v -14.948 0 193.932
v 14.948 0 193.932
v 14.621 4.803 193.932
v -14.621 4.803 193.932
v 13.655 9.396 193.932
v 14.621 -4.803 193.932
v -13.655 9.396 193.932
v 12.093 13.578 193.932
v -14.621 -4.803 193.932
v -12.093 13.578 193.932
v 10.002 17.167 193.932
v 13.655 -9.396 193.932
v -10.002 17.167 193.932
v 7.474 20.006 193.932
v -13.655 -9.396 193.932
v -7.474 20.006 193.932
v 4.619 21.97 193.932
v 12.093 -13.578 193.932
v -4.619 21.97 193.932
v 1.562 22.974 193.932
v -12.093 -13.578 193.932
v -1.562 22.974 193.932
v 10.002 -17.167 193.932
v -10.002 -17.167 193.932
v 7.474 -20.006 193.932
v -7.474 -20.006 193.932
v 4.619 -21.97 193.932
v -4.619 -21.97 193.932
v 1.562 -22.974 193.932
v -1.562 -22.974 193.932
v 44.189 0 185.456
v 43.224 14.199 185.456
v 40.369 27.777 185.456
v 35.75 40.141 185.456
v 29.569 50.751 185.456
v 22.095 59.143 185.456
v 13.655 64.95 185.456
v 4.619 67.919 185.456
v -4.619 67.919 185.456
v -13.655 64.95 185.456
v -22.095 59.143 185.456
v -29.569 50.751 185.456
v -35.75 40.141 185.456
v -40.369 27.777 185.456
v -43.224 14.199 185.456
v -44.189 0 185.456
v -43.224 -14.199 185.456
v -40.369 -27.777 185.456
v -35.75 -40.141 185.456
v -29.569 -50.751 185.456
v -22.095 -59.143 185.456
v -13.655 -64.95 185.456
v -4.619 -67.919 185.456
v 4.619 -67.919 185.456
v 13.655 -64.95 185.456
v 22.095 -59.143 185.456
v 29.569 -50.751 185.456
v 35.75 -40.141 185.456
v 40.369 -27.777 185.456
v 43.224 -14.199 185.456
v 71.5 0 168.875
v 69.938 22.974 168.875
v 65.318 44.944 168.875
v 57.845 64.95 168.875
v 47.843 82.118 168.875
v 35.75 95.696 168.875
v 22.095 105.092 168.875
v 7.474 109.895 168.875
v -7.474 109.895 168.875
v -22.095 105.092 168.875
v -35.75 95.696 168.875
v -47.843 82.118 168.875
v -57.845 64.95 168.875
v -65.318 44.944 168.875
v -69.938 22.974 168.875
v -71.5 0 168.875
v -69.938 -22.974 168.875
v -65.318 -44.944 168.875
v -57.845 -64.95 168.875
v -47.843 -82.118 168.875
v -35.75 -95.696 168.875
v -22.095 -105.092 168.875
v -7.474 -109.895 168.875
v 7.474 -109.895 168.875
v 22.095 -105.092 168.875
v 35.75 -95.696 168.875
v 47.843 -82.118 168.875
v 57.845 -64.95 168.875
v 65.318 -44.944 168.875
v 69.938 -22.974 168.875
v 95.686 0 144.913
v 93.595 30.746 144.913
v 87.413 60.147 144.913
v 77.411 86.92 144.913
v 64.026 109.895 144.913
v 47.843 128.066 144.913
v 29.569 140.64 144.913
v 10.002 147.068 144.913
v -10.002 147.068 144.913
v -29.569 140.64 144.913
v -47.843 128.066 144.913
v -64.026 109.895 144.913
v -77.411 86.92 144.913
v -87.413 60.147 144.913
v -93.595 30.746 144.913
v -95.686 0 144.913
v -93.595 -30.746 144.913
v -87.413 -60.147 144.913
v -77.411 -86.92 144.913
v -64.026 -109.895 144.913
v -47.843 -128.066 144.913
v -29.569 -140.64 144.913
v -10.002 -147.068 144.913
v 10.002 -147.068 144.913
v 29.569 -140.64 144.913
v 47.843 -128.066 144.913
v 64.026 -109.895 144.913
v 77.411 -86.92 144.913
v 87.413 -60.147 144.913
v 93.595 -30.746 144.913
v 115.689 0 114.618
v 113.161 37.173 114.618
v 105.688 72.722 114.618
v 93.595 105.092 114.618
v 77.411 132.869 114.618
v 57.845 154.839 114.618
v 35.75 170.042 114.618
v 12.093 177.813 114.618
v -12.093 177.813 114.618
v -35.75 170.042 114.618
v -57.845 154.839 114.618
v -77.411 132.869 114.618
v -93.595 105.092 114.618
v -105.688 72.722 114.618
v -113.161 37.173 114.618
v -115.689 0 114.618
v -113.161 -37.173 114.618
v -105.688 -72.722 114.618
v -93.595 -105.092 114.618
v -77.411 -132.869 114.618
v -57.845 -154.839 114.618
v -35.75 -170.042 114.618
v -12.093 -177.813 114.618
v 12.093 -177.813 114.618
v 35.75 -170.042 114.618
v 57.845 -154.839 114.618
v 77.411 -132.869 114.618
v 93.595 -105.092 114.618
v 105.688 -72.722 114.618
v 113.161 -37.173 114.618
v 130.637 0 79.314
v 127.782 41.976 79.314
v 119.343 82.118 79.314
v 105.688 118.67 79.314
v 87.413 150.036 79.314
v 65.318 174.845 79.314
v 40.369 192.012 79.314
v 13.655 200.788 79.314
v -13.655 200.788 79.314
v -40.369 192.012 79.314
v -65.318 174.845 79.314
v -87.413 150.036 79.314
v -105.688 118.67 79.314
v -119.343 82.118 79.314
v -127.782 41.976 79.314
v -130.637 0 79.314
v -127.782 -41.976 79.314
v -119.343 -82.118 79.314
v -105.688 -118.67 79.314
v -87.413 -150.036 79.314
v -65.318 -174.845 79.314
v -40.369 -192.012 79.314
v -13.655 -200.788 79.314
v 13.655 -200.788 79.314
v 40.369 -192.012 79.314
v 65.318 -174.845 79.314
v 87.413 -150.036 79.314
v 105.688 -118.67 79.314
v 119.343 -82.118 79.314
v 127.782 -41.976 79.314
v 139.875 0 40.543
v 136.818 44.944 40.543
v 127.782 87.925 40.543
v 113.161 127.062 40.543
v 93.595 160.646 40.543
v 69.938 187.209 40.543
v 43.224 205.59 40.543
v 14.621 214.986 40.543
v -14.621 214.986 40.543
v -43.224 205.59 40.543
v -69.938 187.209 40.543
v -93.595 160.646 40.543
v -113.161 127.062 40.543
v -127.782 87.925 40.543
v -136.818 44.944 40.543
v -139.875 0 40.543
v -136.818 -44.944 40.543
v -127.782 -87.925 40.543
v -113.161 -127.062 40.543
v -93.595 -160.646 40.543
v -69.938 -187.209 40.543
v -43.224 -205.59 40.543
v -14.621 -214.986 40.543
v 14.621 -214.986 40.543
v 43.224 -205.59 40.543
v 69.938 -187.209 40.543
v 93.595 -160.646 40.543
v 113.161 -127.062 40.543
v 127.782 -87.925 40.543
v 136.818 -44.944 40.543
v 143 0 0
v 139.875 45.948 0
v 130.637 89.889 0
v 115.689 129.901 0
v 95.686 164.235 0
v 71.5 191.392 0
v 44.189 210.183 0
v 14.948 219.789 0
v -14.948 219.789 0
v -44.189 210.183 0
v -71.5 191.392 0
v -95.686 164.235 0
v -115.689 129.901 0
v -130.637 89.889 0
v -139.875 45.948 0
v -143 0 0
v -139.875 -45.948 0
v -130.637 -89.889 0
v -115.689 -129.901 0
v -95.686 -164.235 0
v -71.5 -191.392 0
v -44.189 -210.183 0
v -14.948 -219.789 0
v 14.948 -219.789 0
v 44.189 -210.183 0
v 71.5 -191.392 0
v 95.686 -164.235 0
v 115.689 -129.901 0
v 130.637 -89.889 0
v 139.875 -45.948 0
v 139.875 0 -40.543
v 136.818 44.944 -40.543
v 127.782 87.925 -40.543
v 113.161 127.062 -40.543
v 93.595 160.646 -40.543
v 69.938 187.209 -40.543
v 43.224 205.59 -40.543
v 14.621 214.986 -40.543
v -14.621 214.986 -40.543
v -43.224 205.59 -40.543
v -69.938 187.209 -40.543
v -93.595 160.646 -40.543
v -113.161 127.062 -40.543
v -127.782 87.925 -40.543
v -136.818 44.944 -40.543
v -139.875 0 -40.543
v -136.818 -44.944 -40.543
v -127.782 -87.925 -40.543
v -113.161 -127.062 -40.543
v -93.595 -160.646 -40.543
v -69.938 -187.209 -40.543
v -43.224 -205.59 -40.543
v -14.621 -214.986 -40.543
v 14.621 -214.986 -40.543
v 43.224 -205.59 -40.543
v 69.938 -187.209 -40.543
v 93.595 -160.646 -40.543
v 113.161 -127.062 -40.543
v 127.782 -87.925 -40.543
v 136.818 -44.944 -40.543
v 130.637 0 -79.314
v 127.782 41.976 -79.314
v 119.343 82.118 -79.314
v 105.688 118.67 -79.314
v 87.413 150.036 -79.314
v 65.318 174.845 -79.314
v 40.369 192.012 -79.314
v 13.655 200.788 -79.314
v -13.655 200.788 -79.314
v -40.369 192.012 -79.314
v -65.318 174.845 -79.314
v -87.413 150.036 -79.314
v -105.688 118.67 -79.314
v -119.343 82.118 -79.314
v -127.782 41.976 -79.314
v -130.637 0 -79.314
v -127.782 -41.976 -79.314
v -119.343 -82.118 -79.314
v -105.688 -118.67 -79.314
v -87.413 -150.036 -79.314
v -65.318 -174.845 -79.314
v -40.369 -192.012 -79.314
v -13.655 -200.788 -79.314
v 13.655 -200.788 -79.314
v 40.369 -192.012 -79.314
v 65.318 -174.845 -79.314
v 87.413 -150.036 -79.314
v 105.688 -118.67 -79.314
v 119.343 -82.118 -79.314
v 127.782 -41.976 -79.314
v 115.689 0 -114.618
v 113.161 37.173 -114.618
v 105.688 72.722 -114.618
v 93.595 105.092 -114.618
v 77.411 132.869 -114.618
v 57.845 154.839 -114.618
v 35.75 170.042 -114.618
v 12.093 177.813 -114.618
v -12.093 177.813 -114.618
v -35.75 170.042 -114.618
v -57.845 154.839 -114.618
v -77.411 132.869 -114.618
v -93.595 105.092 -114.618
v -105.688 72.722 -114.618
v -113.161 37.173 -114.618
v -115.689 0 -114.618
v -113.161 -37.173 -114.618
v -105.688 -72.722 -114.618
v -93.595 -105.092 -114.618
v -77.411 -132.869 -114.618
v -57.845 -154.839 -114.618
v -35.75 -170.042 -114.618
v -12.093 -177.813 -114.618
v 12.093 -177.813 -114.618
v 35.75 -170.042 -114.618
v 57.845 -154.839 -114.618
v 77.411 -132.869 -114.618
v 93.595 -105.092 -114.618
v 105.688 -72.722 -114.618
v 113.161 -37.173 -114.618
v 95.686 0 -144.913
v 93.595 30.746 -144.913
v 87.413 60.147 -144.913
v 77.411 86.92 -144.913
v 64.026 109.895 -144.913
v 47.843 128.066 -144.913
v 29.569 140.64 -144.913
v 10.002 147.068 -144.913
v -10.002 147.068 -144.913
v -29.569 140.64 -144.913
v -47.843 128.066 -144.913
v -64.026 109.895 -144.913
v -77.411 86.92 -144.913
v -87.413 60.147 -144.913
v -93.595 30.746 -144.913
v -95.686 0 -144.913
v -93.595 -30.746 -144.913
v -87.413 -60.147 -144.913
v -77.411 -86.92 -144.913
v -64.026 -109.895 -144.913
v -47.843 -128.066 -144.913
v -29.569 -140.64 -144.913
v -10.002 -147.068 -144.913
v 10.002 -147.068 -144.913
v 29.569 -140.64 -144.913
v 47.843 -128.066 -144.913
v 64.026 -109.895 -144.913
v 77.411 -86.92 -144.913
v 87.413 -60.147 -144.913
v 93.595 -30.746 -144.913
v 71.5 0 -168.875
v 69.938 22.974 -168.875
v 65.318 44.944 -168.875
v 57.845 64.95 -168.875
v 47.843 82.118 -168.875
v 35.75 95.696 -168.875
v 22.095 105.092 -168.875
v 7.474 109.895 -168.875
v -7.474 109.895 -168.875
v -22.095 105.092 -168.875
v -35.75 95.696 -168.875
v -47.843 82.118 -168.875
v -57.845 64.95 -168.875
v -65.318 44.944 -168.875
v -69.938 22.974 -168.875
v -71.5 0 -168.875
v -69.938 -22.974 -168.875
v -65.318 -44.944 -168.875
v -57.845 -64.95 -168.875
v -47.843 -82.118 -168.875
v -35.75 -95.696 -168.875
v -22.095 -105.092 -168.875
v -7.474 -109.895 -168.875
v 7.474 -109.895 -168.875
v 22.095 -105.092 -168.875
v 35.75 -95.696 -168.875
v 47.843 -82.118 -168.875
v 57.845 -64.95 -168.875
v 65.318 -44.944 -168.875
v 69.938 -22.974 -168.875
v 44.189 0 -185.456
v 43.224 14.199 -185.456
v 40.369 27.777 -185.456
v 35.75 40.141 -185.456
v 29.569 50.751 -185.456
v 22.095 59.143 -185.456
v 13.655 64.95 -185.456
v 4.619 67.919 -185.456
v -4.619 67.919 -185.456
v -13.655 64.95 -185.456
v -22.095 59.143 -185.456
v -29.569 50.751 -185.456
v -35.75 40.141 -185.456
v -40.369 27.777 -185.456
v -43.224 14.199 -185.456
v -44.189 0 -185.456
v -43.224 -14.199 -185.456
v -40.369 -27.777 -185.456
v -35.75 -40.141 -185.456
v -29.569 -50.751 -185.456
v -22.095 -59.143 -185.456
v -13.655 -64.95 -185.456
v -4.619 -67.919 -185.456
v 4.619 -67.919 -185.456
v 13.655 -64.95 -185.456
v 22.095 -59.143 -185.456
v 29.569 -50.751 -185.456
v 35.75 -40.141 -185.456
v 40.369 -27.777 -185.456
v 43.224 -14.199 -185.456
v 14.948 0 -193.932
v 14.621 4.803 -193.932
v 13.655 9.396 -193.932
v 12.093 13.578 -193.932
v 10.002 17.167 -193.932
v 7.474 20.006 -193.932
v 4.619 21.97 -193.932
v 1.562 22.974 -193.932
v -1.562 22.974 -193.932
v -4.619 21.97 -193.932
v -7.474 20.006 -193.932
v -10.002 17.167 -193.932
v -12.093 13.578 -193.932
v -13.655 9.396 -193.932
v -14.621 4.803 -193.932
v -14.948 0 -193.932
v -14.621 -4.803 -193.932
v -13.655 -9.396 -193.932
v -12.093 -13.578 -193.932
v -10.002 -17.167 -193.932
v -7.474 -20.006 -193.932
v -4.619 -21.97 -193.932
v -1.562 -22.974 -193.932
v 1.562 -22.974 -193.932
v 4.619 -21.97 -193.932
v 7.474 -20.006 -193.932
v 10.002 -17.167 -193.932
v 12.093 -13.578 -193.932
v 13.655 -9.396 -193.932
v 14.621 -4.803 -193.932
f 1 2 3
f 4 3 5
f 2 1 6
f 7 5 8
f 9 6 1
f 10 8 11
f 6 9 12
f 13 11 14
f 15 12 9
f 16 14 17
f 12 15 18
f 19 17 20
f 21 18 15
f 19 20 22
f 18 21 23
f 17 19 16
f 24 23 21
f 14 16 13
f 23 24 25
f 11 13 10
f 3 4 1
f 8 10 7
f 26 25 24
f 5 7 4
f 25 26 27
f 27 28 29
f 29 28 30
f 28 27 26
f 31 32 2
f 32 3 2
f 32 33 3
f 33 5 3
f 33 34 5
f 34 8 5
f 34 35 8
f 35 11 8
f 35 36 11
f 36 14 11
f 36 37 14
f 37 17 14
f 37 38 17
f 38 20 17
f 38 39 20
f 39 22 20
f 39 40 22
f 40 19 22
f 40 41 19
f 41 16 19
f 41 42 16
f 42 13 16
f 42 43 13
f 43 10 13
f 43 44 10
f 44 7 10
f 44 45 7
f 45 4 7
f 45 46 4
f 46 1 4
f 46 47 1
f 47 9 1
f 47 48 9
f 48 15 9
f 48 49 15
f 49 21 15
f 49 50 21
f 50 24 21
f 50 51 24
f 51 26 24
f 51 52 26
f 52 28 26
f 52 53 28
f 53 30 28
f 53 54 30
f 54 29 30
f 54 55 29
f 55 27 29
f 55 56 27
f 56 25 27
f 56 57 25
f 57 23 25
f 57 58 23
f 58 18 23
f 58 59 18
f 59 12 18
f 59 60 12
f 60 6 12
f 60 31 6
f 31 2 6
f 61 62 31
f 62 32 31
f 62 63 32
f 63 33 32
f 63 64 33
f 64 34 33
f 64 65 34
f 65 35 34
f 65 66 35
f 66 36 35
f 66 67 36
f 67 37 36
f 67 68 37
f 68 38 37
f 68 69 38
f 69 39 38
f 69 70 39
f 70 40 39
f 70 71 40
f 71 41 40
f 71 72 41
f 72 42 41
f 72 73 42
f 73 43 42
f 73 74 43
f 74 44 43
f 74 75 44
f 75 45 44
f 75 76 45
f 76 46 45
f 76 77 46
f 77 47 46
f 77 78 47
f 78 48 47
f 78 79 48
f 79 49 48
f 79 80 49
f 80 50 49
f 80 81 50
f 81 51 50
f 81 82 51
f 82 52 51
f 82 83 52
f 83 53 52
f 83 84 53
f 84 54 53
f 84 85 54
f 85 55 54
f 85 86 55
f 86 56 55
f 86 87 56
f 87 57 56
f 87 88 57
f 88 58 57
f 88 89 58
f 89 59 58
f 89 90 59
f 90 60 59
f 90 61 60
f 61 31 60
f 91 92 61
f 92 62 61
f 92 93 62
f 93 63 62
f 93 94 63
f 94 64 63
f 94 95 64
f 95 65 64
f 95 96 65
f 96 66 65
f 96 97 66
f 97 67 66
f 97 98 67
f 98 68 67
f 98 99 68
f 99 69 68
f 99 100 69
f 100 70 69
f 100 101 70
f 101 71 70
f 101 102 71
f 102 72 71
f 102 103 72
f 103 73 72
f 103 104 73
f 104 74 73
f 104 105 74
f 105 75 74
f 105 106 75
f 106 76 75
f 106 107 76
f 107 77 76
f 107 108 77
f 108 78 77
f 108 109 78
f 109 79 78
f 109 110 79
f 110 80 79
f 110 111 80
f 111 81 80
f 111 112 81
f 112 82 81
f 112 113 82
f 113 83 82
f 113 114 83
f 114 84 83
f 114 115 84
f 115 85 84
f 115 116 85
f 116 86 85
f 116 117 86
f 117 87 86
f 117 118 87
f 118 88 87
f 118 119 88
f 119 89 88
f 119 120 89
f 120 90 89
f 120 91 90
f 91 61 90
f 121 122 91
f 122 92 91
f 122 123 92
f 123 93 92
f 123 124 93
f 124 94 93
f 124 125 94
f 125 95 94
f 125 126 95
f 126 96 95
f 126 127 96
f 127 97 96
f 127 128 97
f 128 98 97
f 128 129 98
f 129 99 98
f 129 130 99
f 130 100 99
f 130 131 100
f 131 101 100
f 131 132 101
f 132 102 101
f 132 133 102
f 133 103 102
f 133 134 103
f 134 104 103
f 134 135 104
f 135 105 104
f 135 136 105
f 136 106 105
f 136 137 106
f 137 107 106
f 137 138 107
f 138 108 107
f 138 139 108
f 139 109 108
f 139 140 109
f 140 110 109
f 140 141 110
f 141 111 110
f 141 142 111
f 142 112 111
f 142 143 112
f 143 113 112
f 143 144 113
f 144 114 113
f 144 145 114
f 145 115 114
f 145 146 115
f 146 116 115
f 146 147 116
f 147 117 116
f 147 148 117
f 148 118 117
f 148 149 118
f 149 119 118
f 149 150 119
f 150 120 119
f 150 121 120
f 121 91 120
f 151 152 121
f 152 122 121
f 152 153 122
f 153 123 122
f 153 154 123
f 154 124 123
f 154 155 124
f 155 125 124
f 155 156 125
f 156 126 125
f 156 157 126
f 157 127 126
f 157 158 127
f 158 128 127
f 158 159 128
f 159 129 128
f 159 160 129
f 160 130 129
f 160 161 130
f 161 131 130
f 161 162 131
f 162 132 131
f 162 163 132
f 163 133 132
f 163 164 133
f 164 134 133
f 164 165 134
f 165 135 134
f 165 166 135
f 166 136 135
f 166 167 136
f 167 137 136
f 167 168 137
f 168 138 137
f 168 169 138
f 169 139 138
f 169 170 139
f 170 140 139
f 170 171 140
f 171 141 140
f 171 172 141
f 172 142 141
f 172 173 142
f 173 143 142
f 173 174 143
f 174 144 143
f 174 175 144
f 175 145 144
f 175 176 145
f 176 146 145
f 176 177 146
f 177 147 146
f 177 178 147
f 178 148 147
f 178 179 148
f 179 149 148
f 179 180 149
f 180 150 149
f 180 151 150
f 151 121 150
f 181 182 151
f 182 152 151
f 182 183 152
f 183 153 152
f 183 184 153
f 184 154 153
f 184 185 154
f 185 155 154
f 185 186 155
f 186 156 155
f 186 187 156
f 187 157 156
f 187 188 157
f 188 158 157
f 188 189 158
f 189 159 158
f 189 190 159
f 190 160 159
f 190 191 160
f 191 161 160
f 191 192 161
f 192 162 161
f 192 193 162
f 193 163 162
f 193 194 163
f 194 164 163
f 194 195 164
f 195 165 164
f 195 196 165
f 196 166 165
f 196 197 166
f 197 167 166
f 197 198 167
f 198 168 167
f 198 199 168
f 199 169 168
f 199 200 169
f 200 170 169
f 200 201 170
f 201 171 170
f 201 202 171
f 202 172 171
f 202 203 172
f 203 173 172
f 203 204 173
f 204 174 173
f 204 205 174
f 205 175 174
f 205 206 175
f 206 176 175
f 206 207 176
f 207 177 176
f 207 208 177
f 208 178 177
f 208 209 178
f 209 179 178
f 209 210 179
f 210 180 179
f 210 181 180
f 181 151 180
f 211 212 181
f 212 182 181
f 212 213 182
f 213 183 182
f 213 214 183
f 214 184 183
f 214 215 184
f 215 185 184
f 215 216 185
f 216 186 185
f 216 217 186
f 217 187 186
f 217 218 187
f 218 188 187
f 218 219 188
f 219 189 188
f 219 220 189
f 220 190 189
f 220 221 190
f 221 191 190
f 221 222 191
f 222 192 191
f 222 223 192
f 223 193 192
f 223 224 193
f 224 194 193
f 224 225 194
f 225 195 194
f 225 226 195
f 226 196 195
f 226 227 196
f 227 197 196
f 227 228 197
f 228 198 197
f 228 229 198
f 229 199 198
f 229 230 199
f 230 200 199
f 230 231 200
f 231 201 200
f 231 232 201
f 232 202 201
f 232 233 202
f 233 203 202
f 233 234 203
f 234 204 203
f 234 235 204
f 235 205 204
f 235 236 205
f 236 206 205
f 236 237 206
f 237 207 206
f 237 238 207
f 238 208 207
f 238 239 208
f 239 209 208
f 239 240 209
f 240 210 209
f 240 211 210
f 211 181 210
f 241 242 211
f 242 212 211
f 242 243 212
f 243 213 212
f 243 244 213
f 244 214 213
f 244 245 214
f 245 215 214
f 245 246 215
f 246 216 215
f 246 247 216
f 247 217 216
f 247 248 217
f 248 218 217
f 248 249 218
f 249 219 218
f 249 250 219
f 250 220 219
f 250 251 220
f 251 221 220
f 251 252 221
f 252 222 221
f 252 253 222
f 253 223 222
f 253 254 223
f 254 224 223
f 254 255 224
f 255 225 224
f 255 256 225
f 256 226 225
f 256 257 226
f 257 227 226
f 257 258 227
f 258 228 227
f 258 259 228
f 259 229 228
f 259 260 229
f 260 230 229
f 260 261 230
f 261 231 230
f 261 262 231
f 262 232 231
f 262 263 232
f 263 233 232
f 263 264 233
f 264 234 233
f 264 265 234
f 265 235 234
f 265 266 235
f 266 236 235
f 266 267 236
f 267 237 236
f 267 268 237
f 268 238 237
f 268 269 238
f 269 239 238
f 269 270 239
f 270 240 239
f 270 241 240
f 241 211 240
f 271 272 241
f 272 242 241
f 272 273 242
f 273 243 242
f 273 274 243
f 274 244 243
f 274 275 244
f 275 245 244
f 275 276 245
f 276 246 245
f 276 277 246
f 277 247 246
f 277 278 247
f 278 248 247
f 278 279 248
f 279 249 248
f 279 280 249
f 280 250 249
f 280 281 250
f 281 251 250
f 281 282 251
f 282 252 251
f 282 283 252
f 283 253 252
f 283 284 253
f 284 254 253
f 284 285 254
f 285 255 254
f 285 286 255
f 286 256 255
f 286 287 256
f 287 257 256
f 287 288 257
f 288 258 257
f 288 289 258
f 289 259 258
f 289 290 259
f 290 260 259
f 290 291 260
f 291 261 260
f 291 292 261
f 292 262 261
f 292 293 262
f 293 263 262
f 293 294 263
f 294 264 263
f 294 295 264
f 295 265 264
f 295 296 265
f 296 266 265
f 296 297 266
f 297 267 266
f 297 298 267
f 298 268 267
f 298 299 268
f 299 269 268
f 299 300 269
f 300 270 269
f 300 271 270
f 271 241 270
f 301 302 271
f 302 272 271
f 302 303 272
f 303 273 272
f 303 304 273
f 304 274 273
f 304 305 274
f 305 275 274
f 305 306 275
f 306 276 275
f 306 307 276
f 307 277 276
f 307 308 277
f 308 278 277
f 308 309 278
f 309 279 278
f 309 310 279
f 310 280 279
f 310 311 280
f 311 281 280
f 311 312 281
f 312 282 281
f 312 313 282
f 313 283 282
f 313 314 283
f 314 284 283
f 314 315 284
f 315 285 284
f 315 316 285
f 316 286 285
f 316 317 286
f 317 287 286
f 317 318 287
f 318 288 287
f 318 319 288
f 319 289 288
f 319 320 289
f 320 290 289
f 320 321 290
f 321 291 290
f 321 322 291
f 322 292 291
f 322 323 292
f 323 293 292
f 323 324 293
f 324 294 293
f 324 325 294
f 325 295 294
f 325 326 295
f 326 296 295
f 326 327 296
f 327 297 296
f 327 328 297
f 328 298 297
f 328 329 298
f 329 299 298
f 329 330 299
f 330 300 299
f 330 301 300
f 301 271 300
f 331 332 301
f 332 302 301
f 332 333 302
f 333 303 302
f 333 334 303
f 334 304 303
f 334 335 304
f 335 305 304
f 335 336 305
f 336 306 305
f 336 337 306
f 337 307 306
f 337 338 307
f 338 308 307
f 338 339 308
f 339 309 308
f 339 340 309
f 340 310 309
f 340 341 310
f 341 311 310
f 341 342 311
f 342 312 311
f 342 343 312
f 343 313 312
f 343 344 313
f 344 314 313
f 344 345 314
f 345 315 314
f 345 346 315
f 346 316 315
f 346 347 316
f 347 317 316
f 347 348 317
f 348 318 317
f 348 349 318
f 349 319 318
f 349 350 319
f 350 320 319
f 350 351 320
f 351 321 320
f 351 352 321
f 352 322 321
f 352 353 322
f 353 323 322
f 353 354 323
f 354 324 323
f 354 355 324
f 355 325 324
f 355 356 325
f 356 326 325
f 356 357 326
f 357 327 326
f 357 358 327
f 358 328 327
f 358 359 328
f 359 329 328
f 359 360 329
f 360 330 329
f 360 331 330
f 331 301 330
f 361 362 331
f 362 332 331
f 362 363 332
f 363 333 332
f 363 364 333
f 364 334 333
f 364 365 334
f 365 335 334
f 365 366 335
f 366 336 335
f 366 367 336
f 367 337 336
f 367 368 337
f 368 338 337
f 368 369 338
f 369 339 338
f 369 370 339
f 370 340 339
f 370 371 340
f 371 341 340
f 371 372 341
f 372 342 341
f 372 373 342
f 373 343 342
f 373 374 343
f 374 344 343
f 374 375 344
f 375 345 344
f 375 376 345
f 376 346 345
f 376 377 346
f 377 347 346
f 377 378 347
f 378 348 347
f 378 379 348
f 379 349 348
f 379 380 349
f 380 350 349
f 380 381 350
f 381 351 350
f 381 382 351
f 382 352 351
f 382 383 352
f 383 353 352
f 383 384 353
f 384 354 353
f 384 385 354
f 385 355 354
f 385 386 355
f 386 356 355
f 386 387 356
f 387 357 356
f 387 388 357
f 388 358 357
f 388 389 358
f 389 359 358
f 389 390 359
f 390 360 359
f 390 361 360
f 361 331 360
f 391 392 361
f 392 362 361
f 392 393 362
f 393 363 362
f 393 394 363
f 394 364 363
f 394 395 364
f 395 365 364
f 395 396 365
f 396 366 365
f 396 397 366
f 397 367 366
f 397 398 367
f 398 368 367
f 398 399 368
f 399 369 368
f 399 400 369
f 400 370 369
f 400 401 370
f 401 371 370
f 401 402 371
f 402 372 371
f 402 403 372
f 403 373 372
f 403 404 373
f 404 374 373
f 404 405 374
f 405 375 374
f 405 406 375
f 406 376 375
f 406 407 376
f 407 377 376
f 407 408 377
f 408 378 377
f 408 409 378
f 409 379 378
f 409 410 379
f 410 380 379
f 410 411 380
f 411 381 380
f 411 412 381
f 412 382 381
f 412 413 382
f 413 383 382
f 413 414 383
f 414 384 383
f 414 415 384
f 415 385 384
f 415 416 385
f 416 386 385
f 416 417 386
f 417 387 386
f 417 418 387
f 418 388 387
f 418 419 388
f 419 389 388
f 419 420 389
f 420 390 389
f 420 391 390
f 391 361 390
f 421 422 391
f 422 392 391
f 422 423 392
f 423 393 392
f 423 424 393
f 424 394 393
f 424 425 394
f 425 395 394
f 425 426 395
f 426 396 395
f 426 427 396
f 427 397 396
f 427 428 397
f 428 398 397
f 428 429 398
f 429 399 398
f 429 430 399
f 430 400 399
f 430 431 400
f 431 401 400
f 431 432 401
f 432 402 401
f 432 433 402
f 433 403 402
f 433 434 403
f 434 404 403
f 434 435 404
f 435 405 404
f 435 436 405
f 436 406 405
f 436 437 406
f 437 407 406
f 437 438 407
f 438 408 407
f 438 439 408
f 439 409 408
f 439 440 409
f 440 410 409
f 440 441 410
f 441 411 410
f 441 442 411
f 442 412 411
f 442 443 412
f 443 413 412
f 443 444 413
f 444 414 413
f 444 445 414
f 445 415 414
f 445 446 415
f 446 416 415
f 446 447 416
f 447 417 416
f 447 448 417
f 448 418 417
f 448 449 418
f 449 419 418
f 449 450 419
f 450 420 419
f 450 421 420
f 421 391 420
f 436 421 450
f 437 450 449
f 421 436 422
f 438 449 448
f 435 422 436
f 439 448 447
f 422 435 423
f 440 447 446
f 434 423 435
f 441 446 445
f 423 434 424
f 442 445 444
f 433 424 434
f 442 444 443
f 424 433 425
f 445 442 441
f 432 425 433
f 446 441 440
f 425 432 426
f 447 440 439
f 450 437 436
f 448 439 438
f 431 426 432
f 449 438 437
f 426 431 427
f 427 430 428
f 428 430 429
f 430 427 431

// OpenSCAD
// Generated by SolidPython 1.0.1 on 2020-07-29 00:46:50


scale(v = [11, 17, 15]) {
	sphere(r = 13);
}
/***********************************************
*********      SolidPython code:      **********
************************************************
 
# import packages: SolidPython
from solid import *
from solid.utils import *
from itertools import chain, combinations, permutations


class Resize:

    def __init__(self, scad_file):
        self.scad_file = scad_file
        #self.scad_file = import_scad(scad_file)
        # cone/cylinder param:
        self.r1 = 0
        self.r2 = 0
        self.h = 0
        # rectangular prism param:
        self.w = 0
        self.l = 0
        # ellipse param:
        self.r = 0

    # import OpenScad code (file name corresponds to shape)


    # classify shape + parameters
    def assign(self, param1, param2, param3):
        if self.scad_file == 'cone.scad':
            self.r1 = param1
            self.r2 = param2
            self.h = param3
        elif self.scad_file == 'cylinder.scad':
            self.r1 = param1
            self.r2 = param2
            self.h = param3
        elif self.scad_file == 'rectangularPrism.scad':
            self.h = param1
            self.l = param2
            self.w = param3
        else:
            self.r = param1
            self.h = param2

    # resize parameters
    def iterate(self):
        x = range(3, 20, 2)
        i = 1
        if self.scad_file == 'cone.scad':
            tempList = list(permutations(x, 2))
            for temp in tempList:
                param1 = temp[0]
                param2 = temp[1]
                filepath = 'produced_scad_files/' + 'cone' + str(param1) + '_' + str(param2) + '_' + '.scad'
                scad_render_to_file(cylinder(h=param1, r1=param2, r2=0), filepath)

        elif self.scad_file == 'cylinder.scad':
            tempList = list(permutations(x, 3))
            for temp in tempList:
                param1 = temp[0]
                param2 = temp[1]
                filepath = 'produced_scad_files/' + 'cylinder' + str(param1) + '_' + str(param2) + '_' + '.scad'
                scad_render_to_file(cylinder(h=param1, r1=param2, r2=param2), filepath)

        elif self.scad_file == 'rectangularPrism.scad':
            tempList = list(permutations(x, 3))
            for temp in tempList:
                param1 = temp[0]
                param2 = temp[1]
                param3 = temp[2]
                filepath = 'produced_scad_files/' + 'rectangularPrism' + str(param1) + '_' + str(param2) + '_' + str(
                    param3) + '.scad'
                scad_render_to_file(cube(size=(param1, param2, param3)), filepath)

        elif self.scad_file == 'ellipse.scad':
            tempList = list(permutations(x, 4))
            for temp in tempList:
                param1 = temp[0]
                param2 = temp[1]
                param3 = temp[2]
                param4 = temp[3]
                filepath = 'produced_scad_files/' + 'ellipse' + str(param1) + '_' + str(param2) + '_' + str(param3) + '_' + str(param4) + '.scad'
                scad_render_to_file(scale([param1, param2, param3])(sphere(r=param4)), filepath)

    def render_to_scadfile(self):
        scad_render_to_file(scad, 'example.scad') 
 
************************************************/
